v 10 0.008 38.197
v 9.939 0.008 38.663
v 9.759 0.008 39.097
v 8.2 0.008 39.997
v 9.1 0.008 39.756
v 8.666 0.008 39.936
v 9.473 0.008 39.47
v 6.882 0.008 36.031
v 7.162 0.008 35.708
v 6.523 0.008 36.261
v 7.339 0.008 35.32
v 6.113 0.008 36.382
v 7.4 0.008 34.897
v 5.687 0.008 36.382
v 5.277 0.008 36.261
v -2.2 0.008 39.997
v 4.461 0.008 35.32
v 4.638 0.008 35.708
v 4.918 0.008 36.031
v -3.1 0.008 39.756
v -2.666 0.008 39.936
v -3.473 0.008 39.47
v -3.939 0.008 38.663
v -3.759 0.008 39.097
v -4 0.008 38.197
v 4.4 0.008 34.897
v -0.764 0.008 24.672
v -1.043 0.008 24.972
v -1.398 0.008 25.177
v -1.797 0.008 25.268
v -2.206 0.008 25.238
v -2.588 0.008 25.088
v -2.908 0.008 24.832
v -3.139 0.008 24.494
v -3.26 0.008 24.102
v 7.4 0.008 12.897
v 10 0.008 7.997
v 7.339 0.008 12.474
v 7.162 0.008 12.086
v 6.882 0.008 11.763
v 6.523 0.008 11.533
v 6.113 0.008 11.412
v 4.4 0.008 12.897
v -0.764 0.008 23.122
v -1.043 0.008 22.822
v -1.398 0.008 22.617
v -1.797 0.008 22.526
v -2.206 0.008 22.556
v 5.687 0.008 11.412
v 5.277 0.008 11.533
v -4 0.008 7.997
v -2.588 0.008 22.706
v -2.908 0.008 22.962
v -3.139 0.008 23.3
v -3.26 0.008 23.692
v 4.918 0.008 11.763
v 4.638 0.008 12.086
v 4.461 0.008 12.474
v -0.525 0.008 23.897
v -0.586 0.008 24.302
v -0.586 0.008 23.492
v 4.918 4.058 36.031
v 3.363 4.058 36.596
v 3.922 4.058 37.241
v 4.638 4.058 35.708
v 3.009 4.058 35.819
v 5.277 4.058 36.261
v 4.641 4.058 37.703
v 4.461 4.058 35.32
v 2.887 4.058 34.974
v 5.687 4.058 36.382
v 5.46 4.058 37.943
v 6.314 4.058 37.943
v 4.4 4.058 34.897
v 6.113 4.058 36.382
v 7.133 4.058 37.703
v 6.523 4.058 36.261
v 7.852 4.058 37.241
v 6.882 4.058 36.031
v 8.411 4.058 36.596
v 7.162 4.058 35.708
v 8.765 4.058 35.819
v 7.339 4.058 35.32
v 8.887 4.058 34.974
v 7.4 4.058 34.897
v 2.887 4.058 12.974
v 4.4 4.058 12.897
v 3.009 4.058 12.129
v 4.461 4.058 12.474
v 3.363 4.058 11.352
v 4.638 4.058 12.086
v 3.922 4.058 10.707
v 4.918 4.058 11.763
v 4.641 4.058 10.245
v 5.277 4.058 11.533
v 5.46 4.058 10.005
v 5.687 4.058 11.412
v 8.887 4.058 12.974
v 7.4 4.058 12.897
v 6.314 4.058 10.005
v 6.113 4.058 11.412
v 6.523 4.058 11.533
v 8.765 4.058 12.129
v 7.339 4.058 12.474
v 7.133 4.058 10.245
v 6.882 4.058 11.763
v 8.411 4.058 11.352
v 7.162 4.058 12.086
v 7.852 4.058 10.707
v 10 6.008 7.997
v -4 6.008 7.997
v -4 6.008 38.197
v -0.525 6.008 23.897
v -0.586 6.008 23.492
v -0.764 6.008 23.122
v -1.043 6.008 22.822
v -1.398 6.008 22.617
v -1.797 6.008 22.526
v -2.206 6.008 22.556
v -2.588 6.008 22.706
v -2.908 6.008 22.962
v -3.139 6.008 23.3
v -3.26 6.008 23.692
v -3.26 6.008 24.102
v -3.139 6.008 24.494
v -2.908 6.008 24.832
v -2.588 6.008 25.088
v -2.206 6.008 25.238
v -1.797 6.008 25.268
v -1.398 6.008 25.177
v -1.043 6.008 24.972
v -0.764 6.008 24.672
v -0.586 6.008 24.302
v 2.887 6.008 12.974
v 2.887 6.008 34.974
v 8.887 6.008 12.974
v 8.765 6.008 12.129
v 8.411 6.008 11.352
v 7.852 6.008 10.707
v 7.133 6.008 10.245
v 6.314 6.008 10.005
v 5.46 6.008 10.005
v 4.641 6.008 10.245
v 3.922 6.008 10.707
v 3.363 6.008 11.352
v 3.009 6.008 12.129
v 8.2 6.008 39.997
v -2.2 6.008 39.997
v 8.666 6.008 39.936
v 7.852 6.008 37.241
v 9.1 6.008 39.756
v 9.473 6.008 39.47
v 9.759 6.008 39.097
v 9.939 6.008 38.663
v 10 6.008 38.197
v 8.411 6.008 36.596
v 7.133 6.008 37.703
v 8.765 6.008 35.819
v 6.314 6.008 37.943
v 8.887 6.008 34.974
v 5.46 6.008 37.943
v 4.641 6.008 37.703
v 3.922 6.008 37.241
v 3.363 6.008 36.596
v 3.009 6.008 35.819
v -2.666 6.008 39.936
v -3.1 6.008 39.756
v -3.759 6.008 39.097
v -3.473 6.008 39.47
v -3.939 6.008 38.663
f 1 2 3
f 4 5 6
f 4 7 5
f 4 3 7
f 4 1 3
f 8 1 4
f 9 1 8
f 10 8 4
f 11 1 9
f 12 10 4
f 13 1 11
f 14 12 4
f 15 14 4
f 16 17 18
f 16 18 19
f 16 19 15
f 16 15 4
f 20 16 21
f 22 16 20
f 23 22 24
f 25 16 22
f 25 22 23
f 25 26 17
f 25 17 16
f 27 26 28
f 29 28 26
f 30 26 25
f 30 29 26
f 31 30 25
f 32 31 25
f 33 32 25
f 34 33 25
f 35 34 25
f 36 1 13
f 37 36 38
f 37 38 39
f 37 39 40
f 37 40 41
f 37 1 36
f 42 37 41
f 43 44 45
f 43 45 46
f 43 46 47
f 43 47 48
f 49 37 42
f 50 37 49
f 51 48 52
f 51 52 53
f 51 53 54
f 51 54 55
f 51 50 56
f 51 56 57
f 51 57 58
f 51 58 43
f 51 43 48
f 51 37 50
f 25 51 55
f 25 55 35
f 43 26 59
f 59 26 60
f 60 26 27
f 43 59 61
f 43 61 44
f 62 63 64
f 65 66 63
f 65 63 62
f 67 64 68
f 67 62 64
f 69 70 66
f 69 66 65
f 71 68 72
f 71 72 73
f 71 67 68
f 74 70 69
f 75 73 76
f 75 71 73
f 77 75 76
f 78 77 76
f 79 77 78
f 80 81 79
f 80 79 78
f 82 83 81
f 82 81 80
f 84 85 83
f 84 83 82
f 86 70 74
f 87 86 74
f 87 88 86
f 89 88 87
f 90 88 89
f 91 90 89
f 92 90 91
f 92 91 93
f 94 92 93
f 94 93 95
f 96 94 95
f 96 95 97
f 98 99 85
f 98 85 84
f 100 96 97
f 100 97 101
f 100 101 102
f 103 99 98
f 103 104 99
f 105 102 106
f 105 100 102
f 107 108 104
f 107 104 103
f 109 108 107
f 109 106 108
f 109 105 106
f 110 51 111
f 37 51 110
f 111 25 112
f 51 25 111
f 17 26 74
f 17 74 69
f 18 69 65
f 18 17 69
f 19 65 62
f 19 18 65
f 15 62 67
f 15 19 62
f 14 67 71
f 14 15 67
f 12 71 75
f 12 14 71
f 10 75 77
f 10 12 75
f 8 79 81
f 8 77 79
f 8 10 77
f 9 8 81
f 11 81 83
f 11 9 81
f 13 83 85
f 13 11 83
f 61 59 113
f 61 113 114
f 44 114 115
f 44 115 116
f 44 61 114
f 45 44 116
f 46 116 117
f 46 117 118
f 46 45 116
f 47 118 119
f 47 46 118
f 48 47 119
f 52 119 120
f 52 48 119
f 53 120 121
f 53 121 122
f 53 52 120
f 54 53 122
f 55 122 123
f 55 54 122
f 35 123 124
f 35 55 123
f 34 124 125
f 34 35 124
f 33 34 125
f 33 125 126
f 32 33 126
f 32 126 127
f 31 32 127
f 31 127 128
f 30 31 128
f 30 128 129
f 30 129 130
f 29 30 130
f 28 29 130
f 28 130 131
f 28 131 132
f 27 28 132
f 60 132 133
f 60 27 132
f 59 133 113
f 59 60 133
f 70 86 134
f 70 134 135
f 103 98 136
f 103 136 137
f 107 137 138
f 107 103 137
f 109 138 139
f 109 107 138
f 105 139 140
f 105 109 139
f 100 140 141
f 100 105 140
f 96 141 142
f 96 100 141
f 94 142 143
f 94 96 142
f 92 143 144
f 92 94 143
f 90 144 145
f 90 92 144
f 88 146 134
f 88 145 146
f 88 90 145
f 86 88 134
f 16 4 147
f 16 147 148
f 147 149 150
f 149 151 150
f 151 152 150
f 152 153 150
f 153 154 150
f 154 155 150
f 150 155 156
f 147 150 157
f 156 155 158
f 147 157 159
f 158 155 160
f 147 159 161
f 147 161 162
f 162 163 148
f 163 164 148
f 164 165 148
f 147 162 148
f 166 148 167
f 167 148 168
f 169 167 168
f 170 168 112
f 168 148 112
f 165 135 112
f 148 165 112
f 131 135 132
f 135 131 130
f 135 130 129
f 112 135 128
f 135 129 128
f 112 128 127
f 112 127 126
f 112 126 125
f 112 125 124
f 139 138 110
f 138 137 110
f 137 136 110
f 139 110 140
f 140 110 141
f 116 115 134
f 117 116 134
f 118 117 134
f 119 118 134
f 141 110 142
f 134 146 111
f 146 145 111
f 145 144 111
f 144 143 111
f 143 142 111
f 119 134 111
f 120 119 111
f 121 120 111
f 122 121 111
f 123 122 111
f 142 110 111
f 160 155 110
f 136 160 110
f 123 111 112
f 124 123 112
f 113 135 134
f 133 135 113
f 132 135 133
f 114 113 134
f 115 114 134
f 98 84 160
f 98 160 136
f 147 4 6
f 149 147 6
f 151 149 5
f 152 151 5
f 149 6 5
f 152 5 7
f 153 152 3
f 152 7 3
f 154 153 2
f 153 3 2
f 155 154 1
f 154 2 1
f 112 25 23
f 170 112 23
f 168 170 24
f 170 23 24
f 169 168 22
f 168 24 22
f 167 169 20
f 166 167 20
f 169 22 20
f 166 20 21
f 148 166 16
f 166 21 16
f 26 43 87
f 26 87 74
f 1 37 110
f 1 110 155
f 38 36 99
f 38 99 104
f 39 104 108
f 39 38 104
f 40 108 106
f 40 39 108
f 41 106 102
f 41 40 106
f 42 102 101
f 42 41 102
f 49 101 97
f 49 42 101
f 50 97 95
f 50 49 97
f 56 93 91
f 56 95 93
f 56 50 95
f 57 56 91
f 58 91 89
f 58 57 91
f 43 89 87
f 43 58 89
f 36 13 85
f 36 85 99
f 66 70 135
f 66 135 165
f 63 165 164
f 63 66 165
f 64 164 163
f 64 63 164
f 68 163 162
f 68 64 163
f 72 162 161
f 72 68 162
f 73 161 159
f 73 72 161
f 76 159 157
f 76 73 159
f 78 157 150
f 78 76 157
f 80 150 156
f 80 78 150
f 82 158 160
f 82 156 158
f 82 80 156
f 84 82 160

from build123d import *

# Parameters (mm, degrees)
PAD014_DEPTH           = 2
SKETCH024_R            = 1.375
PAD011_DEPTH           = 6
CUT045_PLACEMENT_ANGLE = 180


with BuildPart() as slotscrew001:
    # Sketch027 → Pad014 (new body)
    with BuildSketch(Plane.XZ):
        with BuildLine():
            ThreePointArc((8.9, 35), (5.9, 38), (2.9, 35))
            Line((2.9, 35), (2.9, 13))
            ThreePointArc((2.9, 13), (5.9, 10), (8.9, 13))
            Line((8.9, 13), (8.9, 35))
        make_face()
    extrude(amount=PAD014_DEPTH)


with BuildPart() as slotscrew001_1:
    # Body013 placement: moved
    add(slotscrew001.part.moved(Location((-0.013, -4.05, -39.977))))


with BuildPart() as base001:
    # Sketch024 → Pad011 (new body)
    with BuildSketch(Plane.XZ):
        with BuildLine():
            Line((-4, 0), (10, 0))
            Line((10, 0), (10, -30.2))
            ThreePointArc((8.2, -32), (9.472792, -31.472792), (10, -30.2))
            Line((8.2, -32), (-2.2, -32))
            ThreePointArc((-4, -30.2), (-3.472792, -31.472792), (-2.2, -32))
            Line((-4, -30.2), (-4, 0))
        make_face()
        with Locations((-1.9, -15.9)):
            Circle(SKETCH024_R, mode=Mode.SUBTRACT)
        with BuildLine():
            ThreePointArc((4.4, -26.9), (5.9, -28.4), (7.4, -26.9))
            Line((7.4, -26.9), (7.4, -4.9))
            ThreePointArc((7.4, -4.9), (5.9, -3.4), (4.4, -4.9))
            Line((4.4, -4.9), (4.4, -26.9))
        make_face(mode=Mode.SUBTRACT)
    extrude(amount=PAD011_DEPTH)

    # Cut045: cut slotscrew001
    add(slotscrew001_1.part, mode=Mode.SUBTRACT)


with BuildPart() as base001_1:
    # Cut045 placement: moved
    add(base001.part.moved(Location((0, 0.008, 7.997))).rotate(Axis((0, 0.008, 7.997), (1, 0, 0)), CUT045_PLACEMENT_ANGLE))


solid = base001_1.part
